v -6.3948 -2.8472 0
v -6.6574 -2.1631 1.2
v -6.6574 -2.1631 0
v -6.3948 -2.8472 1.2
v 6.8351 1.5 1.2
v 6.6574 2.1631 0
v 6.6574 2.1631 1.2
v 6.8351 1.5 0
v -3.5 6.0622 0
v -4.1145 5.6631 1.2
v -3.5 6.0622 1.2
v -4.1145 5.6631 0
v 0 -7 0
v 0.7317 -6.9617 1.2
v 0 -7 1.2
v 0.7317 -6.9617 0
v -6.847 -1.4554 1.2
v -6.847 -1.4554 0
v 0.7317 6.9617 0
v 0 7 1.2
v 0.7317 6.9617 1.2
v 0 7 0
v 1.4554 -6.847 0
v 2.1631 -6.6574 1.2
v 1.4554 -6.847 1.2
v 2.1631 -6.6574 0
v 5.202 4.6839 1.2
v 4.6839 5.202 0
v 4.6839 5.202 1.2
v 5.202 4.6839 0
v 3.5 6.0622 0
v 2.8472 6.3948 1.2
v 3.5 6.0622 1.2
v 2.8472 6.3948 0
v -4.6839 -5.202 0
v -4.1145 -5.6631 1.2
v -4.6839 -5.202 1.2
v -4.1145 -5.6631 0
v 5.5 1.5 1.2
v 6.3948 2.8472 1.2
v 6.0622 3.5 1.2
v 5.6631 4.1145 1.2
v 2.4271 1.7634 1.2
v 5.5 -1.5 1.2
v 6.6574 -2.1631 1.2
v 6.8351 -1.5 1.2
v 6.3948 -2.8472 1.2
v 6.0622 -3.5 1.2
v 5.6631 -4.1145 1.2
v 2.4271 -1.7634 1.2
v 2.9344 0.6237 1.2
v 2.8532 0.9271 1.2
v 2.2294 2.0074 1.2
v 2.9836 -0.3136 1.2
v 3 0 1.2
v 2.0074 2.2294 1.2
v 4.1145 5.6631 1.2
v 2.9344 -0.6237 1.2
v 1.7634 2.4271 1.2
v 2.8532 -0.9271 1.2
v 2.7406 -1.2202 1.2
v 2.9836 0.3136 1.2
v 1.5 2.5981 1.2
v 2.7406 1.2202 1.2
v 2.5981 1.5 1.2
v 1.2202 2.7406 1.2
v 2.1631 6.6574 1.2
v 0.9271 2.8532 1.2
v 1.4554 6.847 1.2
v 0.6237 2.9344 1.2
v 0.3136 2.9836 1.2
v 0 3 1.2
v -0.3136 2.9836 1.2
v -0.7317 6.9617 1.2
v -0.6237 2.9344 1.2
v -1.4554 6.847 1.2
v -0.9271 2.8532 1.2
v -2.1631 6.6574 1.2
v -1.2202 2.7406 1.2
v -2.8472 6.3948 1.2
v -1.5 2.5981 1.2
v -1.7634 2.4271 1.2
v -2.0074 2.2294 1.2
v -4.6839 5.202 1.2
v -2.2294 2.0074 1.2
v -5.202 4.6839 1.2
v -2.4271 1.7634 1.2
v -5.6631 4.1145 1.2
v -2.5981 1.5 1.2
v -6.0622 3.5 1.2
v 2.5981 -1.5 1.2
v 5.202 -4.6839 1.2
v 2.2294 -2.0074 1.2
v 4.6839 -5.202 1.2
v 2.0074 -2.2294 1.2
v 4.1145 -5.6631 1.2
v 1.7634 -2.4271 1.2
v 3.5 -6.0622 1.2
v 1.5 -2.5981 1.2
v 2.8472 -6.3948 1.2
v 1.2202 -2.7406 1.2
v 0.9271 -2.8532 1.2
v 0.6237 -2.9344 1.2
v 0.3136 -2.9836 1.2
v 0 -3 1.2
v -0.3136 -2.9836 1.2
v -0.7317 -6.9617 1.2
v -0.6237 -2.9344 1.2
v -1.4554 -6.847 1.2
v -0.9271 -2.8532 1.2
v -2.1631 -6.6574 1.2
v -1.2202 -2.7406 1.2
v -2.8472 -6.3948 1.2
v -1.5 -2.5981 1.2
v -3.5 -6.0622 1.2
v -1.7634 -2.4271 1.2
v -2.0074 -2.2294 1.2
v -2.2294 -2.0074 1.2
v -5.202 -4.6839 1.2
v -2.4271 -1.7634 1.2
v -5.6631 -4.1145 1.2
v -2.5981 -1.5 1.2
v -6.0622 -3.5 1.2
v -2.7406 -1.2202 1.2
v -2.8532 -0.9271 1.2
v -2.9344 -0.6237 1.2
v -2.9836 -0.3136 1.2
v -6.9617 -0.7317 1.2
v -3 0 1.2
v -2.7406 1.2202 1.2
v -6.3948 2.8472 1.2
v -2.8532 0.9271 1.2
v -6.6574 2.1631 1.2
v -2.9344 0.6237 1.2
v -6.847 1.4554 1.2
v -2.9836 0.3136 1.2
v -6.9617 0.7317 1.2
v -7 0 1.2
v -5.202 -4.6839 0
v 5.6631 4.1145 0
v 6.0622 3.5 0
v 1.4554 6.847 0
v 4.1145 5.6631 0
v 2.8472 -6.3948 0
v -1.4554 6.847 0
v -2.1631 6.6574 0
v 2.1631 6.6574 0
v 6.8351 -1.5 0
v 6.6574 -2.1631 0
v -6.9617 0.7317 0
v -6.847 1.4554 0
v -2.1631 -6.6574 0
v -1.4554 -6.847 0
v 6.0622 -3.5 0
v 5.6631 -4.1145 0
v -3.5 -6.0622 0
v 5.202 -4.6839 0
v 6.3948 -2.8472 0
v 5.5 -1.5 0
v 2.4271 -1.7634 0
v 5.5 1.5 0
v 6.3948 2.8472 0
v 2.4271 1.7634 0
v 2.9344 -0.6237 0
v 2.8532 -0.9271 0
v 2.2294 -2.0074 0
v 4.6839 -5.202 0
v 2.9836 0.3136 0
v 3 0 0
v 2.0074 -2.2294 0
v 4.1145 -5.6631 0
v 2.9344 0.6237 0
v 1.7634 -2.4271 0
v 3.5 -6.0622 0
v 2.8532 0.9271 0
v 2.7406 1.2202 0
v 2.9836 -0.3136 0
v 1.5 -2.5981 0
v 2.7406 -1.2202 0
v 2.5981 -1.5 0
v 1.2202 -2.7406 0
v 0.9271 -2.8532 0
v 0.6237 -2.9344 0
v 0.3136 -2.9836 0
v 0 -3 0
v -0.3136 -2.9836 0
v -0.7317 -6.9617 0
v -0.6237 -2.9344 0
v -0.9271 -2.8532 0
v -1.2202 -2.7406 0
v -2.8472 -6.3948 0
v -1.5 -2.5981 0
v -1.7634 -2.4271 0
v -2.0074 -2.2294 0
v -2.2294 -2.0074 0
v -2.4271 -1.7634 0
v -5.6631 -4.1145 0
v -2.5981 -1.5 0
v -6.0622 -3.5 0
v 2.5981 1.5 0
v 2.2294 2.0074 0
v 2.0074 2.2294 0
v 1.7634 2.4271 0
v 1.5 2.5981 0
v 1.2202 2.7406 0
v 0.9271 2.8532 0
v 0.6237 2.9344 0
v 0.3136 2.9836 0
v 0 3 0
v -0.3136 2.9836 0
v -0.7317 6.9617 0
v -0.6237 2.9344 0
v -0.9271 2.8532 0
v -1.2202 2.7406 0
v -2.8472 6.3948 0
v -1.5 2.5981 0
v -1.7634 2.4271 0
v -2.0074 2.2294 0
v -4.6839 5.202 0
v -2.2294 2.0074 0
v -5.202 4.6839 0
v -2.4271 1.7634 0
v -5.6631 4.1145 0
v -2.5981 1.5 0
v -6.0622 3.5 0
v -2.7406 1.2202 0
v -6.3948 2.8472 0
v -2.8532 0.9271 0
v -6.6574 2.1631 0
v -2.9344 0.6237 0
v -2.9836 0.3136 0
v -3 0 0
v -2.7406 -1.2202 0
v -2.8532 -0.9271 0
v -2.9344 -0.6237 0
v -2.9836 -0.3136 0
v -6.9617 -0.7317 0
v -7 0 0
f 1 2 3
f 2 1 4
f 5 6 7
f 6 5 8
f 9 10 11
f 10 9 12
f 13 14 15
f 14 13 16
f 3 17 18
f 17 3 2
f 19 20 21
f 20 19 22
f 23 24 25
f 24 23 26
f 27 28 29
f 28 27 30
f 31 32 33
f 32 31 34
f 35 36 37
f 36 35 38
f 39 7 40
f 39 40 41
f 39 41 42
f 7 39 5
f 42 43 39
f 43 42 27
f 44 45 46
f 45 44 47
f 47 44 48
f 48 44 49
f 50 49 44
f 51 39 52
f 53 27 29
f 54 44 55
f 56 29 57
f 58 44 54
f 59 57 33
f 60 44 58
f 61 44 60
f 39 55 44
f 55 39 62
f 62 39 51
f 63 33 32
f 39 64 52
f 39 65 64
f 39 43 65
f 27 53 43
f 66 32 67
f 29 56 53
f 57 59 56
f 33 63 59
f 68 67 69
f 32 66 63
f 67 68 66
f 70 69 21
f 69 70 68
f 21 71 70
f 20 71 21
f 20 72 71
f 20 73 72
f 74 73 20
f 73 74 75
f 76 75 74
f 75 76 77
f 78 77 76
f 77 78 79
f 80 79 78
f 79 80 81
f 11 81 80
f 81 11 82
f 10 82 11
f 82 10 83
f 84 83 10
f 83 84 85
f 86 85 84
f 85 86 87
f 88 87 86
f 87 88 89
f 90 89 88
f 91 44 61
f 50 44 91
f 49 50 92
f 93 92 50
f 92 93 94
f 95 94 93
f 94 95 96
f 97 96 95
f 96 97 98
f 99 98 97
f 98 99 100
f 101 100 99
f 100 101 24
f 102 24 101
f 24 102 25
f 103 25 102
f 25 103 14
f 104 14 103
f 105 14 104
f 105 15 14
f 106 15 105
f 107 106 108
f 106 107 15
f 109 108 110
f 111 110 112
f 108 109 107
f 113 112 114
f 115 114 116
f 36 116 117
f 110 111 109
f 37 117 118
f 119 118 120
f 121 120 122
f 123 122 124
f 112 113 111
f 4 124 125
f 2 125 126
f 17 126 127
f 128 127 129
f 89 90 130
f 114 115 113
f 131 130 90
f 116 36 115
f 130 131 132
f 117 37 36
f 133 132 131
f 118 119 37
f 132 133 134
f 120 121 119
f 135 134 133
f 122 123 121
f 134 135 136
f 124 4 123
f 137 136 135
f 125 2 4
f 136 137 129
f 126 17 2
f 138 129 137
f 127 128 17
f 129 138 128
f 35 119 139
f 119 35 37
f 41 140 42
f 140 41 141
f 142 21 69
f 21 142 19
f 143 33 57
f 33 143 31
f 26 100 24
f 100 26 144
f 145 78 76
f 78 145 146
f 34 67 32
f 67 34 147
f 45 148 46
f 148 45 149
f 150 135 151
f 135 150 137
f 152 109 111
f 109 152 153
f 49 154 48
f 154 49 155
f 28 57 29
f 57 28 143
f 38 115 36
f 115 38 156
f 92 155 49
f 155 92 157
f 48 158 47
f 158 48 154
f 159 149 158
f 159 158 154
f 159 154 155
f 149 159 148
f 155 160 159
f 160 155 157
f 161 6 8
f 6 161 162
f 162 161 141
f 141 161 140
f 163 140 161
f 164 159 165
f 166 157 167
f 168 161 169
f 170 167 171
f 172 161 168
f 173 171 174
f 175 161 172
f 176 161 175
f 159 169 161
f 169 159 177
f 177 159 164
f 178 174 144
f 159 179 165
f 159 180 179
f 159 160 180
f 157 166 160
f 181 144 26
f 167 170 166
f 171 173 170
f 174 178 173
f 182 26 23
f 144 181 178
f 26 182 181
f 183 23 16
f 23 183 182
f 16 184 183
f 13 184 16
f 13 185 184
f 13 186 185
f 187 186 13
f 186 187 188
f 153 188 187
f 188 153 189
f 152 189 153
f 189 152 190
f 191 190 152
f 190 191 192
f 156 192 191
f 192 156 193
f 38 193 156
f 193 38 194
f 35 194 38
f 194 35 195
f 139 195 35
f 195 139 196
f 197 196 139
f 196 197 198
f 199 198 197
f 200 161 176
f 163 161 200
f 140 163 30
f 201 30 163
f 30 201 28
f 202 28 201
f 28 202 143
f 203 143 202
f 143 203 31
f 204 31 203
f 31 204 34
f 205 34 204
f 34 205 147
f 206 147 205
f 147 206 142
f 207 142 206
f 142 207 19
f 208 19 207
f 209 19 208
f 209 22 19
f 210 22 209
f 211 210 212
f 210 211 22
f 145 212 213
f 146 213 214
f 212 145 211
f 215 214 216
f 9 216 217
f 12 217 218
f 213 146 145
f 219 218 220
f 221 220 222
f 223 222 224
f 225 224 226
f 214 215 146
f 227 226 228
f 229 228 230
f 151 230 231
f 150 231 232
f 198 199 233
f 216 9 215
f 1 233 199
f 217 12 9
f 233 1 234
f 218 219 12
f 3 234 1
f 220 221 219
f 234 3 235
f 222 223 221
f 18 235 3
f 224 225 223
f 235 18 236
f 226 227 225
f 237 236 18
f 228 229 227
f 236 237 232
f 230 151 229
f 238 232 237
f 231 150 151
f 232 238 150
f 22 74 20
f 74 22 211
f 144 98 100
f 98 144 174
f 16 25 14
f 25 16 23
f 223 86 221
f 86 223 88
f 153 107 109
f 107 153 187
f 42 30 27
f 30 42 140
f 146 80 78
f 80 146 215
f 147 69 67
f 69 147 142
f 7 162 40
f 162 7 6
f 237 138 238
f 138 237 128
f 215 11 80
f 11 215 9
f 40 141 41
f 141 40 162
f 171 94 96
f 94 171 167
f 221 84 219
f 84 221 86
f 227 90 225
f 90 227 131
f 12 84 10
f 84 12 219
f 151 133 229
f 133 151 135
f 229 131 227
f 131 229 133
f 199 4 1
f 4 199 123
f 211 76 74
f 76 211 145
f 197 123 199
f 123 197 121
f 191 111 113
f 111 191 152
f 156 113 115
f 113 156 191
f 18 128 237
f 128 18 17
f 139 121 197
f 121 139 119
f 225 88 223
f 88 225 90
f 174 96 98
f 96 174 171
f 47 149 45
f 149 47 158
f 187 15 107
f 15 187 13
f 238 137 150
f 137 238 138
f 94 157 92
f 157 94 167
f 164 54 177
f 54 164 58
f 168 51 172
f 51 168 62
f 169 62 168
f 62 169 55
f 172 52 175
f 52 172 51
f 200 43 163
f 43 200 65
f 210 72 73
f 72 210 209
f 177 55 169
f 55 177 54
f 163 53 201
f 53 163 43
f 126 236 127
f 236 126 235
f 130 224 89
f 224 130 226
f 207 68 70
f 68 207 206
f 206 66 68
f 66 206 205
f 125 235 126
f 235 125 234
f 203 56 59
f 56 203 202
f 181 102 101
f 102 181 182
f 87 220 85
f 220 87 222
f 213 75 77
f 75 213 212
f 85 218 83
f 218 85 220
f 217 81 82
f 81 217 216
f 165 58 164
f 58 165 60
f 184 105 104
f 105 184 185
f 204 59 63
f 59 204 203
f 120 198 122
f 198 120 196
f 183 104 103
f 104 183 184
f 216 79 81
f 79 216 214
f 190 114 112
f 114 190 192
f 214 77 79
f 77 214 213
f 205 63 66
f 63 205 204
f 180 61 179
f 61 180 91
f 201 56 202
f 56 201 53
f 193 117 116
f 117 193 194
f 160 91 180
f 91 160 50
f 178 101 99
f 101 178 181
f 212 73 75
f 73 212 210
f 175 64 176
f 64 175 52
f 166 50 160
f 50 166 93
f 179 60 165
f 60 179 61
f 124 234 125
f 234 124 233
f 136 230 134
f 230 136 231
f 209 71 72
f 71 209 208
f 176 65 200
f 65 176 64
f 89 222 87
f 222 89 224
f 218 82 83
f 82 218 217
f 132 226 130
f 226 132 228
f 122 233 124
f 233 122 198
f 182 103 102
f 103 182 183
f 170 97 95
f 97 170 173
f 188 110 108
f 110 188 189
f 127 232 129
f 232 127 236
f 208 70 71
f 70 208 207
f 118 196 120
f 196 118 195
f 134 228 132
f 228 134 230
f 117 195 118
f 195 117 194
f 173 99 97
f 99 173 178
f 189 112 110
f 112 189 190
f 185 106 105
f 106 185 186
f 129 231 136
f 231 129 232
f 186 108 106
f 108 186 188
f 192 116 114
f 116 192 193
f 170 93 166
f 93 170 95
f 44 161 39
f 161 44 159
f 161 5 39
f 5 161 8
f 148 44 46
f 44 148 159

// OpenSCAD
// External retaining ring with installation gap.
$fn = 60;
eps = 0.02;
shaft_d = 6;
outer_d = 14;
thickness = 1.2;
gap = 3;
difference() {
    cylinder(d = outer_d, h = thickness);
    translate([0, 0, -eps]) cylinder(d = shaft_d, h = thickness + 2 * eps);
    translate([outer_d / 2 - gap / 2, -gap / 2, -eps]) cube([gap + eps, gap, thickness + 2 * eps]);
}
